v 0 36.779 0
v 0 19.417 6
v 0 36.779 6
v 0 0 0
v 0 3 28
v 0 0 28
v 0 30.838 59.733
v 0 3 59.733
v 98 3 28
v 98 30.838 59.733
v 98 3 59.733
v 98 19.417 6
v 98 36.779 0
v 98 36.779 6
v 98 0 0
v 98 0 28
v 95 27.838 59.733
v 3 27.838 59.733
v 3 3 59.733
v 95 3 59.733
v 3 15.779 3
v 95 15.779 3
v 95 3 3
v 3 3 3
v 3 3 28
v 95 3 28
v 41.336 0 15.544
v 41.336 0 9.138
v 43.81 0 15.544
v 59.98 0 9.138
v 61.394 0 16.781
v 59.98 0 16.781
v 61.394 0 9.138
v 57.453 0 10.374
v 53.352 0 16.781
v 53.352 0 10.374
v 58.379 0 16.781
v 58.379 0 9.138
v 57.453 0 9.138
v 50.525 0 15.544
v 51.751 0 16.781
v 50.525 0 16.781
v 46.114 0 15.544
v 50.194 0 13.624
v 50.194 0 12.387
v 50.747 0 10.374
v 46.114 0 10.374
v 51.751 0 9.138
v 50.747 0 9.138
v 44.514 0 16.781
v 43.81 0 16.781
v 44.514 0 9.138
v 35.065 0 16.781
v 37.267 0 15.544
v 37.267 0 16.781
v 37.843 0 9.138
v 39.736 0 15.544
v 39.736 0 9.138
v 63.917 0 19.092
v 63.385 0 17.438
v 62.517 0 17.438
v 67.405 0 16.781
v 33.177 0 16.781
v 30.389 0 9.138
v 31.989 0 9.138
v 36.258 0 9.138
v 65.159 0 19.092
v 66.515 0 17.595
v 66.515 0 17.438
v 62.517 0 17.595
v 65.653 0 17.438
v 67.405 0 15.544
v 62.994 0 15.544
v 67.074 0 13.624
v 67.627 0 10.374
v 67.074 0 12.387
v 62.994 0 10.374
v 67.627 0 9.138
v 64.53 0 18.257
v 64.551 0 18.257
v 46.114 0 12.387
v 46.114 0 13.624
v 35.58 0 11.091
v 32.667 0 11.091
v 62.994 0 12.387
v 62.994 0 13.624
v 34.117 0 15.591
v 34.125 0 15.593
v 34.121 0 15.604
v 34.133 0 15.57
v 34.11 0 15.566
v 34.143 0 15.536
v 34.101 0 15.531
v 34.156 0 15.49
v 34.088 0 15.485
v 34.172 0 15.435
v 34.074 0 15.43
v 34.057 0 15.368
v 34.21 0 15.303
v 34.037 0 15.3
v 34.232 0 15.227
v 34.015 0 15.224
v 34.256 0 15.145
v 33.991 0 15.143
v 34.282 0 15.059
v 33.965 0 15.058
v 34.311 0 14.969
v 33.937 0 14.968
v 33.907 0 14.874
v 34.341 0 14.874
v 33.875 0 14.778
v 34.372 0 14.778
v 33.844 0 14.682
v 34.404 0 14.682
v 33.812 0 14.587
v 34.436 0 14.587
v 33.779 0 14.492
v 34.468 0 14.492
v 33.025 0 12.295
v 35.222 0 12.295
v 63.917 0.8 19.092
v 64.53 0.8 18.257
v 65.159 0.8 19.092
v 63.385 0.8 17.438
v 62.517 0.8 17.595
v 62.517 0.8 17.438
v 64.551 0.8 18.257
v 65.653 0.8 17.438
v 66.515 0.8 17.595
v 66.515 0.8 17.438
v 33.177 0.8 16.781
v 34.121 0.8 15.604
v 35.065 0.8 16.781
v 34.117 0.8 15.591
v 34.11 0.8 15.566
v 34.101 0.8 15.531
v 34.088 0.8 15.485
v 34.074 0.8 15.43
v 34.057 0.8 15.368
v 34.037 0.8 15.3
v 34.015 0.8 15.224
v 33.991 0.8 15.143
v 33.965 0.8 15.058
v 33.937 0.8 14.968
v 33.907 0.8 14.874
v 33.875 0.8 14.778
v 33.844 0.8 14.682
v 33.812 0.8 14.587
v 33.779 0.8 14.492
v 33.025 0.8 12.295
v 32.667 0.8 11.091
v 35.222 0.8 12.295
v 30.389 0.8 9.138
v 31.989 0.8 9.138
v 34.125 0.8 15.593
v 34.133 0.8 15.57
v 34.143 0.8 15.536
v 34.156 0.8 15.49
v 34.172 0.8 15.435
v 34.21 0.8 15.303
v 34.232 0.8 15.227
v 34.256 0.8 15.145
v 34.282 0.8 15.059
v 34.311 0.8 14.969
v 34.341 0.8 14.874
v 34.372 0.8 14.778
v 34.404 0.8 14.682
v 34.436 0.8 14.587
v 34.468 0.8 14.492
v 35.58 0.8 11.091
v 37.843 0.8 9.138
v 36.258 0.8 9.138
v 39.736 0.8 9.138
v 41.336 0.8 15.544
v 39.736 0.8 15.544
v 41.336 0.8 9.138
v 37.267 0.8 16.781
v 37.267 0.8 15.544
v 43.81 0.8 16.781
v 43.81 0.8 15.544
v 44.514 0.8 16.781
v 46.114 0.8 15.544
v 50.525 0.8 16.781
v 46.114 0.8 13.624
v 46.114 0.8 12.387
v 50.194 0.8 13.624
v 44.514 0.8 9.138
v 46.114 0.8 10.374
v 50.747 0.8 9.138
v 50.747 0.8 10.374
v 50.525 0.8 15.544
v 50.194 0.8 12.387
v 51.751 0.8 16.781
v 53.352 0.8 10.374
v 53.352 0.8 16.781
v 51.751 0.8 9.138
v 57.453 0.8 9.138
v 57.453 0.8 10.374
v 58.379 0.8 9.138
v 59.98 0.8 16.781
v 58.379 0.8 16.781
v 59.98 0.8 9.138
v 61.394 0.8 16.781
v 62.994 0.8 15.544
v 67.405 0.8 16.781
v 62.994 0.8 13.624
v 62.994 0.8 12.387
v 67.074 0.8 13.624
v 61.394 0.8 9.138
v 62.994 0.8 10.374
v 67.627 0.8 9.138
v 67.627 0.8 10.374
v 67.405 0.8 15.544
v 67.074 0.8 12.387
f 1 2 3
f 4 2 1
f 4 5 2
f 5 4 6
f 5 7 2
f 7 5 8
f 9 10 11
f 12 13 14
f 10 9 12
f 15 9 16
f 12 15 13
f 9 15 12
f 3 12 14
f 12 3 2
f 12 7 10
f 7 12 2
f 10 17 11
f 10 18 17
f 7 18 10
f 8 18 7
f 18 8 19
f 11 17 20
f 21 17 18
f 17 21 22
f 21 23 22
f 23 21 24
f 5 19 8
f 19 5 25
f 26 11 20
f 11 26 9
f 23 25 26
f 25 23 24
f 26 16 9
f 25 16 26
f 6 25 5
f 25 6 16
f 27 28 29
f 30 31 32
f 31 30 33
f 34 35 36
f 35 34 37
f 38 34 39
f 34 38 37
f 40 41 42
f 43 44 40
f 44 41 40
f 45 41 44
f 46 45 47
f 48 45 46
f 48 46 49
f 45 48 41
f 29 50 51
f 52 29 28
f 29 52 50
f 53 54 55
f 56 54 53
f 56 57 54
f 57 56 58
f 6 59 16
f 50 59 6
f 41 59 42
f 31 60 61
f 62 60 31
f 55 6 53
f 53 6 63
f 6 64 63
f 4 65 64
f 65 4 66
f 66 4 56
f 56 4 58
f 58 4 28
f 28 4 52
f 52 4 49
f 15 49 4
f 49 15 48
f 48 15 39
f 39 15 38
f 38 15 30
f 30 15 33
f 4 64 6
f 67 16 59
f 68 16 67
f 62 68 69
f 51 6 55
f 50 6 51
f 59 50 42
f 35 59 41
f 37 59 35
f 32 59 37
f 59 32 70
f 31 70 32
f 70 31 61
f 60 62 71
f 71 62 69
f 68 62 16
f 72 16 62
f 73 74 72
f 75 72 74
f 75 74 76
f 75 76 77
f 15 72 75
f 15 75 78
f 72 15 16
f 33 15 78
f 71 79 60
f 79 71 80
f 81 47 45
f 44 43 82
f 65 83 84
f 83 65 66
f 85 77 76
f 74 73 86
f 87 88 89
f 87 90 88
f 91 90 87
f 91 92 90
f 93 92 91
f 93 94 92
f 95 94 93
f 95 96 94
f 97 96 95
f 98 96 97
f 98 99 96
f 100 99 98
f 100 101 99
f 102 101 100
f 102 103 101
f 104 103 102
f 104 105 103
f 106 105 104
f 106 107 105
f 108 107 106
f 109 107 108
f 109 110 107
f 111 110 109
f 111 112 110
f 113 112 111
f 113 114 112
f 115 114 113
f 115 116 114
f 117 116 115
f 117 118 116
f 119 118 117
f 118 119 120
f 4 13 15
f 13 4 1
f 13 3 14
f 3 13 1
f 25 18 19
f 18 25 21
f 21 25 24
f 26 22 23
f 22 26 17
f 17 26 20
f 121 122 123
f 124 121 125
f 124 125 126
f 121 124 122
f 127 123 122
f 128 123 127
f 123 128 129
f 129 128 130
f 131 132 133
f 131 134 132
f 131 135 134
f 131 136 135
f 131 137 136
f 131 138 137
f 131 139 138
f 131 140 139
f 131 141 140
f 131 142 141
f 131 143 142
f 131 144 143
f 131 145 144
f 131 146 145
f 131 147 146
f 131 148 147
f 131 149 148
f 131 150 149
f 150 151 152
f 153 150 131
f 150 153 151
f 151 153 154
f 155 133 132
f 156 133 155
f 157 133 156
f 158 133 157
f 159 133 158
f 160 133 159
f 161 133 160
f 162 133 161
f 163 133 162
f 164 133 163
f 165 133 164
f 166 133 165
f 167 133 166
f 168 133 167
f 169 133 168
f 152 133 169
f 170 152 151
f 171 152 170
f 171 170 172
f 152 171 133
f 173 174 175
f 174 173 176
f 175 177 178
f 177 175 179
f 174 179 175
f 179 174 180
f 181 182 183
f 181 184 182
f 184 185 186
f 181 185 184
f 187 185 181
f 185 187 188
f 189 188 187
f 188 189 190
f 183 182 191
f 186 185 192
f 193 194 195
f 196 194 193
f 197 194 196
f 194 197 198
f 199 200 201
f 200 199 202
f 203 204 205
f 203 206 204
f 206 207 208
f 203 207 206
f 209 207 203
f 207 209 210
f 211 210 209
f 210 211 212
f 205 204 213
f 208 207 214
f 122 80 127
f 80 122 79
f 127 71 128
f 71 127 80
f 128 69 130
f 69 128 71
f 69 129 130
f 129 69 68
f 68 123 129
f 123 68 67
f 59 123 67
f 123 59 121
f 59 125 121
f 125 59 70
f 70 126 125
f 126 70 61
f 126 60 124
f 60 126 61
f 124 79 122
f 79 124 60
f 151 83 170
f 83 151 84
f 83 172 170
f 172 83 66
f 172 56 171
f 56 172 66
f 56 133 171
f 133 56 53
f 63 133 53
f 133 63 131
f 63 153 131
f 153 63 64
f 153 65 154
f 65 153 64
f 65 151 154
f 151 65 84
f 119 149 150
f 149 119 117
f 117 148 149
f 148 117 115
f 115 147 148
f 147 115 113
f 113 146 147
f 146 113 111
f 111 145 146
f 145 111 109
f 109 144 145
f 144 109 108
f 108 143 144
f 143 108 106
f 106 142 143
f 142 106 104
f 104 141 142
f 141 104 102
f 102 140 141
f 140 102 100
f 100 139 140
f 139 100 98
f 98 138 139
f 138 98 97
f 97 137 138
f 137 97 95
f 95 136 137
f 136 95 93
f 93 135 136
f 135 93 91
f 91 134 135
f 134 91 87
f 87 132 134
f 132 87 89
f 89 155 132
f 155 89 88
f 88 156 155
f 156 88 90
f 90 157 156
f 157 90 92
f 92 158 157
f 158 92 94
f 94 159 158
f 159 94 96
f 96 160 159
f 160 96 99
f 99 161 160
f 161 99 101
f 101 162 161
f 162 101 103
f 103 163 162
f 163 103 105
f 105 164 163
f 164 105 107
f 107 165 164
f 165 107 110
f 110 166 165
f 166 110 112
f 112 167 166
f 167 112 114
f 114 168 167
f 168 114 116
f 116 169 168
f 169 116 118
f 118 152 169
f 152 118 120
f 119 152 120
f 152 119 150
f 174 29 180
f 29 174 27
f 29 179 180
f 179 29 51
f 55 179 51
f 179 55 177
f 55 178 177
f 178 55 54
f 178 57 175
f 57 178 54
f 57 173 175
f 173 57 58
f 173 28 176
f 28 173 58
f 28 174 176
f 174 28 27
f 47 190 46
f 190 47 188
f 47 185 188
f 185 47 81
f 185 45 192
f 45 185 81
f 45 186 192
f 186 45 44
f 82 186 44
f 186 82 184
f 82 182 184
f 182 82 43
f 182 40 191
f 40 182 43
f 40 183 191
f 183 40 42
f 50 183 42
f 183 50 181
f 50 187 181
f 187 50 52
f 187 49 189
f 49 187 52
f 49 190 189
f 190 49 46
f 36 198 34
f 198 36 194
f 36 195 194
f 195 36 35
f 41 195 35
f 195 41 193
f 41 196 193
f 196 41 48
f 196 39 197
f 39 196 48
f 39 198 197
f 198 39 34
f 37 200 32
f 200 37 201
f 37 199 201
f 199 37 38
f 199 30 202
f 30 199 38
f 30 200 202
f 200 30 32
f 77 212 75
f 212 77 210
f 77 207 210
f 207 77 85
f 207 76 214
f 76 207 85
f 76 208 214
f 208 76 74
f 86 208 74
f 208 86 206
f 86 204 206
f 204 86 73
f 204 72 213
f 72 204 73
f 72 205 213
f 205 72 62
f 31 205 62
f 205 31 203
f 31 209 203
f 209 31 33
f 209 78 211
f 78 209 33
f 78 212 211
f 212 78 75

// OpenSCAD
// Porta-cartão de mesa - ATELIÊ
// Unidades: mm. Peça única, apoiada em z = 0, imprime deitada na base sem suporte.
card_w      = 90;    // largura do cartão (eixo X)
card_h      = 50;    // altura do cartão (ao longo do encosto)
card_clear  = 1;     // folga lateral por lado (eixo X)
stack_t     = 12;    // espessura da pilha de cartões
stack_clear = 0.5;   // folga perpendicular ao encosto
tilt        = 12;    // inclinação do encosto para trás (graus)
wall        = 3;     // espessura de parede, base e encosto (minimo 2)
base_t      = 3;     // espessura da base
side_t      = 3;     // espessura das laterais (eixo X)
front_h     = 28;    // altura do lábio frontal
back_len    = 58;    // comprimento do encosto ao longo da inclinação
heel_len    = 18;    // quanto a base avança para trás do encosto (pé)
heel_h      = 6;     // altura do bloco traseiro (pé)
txt         = "ATELIÊ";
txt_font    = "Liberation Sans:style=Bold";
txt_size    = 8;     // tamanho do texto
txt_depth   = 0.8;   // profundidade da gravação na frente
txt_out     = 1;     // margem extra para o corte do texto sair da face
W      = card_w + 2*card_clear + 2*side_t;   // largura total (X)
gap_p  = stack_t + stack_clear;              // vão perpendicular ao encosto
gap_h  = gap_p / cos(tilt);                  // vão horizontal na base
yi0    = wall + gap_h;                       // face interna do encosto na base
yo0    = yi0 + wall;                         // face externa do encosto na base
dz     = back_len * cos(tilt);               // subida do encosto
zt     = base_t + dz;                        // topo do encosto
yit    = yi0 + dz*tan(tilt);                 // topo, face interna
yot    = yo0 + dz*tan(tilt);                 // topo, face externa
yoh    = yo0 + (heel_h - base_t)*tan(tilt);  // face externa na altura do pé
ye     = yo0 + heel_len;                     // fim traseiro do pé
profile = [
  [0, 0], [ye, 0], [ye, heel_h], [yoh, heel_h],
  [yot, zt], [yit, zt], [yi0, base_t], [wall, base_t],
  [wall, front_h], [0, front_h]
];
side_wall = [
  [wall, 0], [yi0, 0], [yi0, base_t], [yit, zt], [wall, zt]
];
module side_extrude(pts, len) {
  rotate([90, 0, 90]) linear_extrude(height = len) polygon(pts);
}
module body() {
  side_extrude(profile, W);
  side_extrude(side_wall, side_t);
  translate([W - side_t, 0, 0]) side_extrude(side_wall, side_t);
}
module engrave() {
  translate([W/2, txt_depth, front_h/2])
    rotate([90, 0, 0])
      linear_extrude(height = txt_depth + txt_out)
        text(txt, size = txt_size, font = txt_font, halign = "center", valign = "center");
}
difference() {
  body();
  engrave();
}
depth_real  = max([for (p = profile) p[0]]);
height_real = max([for (p = profile) p[1]]);
echo("largura (mm)", W);
echo("profundidade (mm)", depth_real);
echo("altura (mm)", height_real);
